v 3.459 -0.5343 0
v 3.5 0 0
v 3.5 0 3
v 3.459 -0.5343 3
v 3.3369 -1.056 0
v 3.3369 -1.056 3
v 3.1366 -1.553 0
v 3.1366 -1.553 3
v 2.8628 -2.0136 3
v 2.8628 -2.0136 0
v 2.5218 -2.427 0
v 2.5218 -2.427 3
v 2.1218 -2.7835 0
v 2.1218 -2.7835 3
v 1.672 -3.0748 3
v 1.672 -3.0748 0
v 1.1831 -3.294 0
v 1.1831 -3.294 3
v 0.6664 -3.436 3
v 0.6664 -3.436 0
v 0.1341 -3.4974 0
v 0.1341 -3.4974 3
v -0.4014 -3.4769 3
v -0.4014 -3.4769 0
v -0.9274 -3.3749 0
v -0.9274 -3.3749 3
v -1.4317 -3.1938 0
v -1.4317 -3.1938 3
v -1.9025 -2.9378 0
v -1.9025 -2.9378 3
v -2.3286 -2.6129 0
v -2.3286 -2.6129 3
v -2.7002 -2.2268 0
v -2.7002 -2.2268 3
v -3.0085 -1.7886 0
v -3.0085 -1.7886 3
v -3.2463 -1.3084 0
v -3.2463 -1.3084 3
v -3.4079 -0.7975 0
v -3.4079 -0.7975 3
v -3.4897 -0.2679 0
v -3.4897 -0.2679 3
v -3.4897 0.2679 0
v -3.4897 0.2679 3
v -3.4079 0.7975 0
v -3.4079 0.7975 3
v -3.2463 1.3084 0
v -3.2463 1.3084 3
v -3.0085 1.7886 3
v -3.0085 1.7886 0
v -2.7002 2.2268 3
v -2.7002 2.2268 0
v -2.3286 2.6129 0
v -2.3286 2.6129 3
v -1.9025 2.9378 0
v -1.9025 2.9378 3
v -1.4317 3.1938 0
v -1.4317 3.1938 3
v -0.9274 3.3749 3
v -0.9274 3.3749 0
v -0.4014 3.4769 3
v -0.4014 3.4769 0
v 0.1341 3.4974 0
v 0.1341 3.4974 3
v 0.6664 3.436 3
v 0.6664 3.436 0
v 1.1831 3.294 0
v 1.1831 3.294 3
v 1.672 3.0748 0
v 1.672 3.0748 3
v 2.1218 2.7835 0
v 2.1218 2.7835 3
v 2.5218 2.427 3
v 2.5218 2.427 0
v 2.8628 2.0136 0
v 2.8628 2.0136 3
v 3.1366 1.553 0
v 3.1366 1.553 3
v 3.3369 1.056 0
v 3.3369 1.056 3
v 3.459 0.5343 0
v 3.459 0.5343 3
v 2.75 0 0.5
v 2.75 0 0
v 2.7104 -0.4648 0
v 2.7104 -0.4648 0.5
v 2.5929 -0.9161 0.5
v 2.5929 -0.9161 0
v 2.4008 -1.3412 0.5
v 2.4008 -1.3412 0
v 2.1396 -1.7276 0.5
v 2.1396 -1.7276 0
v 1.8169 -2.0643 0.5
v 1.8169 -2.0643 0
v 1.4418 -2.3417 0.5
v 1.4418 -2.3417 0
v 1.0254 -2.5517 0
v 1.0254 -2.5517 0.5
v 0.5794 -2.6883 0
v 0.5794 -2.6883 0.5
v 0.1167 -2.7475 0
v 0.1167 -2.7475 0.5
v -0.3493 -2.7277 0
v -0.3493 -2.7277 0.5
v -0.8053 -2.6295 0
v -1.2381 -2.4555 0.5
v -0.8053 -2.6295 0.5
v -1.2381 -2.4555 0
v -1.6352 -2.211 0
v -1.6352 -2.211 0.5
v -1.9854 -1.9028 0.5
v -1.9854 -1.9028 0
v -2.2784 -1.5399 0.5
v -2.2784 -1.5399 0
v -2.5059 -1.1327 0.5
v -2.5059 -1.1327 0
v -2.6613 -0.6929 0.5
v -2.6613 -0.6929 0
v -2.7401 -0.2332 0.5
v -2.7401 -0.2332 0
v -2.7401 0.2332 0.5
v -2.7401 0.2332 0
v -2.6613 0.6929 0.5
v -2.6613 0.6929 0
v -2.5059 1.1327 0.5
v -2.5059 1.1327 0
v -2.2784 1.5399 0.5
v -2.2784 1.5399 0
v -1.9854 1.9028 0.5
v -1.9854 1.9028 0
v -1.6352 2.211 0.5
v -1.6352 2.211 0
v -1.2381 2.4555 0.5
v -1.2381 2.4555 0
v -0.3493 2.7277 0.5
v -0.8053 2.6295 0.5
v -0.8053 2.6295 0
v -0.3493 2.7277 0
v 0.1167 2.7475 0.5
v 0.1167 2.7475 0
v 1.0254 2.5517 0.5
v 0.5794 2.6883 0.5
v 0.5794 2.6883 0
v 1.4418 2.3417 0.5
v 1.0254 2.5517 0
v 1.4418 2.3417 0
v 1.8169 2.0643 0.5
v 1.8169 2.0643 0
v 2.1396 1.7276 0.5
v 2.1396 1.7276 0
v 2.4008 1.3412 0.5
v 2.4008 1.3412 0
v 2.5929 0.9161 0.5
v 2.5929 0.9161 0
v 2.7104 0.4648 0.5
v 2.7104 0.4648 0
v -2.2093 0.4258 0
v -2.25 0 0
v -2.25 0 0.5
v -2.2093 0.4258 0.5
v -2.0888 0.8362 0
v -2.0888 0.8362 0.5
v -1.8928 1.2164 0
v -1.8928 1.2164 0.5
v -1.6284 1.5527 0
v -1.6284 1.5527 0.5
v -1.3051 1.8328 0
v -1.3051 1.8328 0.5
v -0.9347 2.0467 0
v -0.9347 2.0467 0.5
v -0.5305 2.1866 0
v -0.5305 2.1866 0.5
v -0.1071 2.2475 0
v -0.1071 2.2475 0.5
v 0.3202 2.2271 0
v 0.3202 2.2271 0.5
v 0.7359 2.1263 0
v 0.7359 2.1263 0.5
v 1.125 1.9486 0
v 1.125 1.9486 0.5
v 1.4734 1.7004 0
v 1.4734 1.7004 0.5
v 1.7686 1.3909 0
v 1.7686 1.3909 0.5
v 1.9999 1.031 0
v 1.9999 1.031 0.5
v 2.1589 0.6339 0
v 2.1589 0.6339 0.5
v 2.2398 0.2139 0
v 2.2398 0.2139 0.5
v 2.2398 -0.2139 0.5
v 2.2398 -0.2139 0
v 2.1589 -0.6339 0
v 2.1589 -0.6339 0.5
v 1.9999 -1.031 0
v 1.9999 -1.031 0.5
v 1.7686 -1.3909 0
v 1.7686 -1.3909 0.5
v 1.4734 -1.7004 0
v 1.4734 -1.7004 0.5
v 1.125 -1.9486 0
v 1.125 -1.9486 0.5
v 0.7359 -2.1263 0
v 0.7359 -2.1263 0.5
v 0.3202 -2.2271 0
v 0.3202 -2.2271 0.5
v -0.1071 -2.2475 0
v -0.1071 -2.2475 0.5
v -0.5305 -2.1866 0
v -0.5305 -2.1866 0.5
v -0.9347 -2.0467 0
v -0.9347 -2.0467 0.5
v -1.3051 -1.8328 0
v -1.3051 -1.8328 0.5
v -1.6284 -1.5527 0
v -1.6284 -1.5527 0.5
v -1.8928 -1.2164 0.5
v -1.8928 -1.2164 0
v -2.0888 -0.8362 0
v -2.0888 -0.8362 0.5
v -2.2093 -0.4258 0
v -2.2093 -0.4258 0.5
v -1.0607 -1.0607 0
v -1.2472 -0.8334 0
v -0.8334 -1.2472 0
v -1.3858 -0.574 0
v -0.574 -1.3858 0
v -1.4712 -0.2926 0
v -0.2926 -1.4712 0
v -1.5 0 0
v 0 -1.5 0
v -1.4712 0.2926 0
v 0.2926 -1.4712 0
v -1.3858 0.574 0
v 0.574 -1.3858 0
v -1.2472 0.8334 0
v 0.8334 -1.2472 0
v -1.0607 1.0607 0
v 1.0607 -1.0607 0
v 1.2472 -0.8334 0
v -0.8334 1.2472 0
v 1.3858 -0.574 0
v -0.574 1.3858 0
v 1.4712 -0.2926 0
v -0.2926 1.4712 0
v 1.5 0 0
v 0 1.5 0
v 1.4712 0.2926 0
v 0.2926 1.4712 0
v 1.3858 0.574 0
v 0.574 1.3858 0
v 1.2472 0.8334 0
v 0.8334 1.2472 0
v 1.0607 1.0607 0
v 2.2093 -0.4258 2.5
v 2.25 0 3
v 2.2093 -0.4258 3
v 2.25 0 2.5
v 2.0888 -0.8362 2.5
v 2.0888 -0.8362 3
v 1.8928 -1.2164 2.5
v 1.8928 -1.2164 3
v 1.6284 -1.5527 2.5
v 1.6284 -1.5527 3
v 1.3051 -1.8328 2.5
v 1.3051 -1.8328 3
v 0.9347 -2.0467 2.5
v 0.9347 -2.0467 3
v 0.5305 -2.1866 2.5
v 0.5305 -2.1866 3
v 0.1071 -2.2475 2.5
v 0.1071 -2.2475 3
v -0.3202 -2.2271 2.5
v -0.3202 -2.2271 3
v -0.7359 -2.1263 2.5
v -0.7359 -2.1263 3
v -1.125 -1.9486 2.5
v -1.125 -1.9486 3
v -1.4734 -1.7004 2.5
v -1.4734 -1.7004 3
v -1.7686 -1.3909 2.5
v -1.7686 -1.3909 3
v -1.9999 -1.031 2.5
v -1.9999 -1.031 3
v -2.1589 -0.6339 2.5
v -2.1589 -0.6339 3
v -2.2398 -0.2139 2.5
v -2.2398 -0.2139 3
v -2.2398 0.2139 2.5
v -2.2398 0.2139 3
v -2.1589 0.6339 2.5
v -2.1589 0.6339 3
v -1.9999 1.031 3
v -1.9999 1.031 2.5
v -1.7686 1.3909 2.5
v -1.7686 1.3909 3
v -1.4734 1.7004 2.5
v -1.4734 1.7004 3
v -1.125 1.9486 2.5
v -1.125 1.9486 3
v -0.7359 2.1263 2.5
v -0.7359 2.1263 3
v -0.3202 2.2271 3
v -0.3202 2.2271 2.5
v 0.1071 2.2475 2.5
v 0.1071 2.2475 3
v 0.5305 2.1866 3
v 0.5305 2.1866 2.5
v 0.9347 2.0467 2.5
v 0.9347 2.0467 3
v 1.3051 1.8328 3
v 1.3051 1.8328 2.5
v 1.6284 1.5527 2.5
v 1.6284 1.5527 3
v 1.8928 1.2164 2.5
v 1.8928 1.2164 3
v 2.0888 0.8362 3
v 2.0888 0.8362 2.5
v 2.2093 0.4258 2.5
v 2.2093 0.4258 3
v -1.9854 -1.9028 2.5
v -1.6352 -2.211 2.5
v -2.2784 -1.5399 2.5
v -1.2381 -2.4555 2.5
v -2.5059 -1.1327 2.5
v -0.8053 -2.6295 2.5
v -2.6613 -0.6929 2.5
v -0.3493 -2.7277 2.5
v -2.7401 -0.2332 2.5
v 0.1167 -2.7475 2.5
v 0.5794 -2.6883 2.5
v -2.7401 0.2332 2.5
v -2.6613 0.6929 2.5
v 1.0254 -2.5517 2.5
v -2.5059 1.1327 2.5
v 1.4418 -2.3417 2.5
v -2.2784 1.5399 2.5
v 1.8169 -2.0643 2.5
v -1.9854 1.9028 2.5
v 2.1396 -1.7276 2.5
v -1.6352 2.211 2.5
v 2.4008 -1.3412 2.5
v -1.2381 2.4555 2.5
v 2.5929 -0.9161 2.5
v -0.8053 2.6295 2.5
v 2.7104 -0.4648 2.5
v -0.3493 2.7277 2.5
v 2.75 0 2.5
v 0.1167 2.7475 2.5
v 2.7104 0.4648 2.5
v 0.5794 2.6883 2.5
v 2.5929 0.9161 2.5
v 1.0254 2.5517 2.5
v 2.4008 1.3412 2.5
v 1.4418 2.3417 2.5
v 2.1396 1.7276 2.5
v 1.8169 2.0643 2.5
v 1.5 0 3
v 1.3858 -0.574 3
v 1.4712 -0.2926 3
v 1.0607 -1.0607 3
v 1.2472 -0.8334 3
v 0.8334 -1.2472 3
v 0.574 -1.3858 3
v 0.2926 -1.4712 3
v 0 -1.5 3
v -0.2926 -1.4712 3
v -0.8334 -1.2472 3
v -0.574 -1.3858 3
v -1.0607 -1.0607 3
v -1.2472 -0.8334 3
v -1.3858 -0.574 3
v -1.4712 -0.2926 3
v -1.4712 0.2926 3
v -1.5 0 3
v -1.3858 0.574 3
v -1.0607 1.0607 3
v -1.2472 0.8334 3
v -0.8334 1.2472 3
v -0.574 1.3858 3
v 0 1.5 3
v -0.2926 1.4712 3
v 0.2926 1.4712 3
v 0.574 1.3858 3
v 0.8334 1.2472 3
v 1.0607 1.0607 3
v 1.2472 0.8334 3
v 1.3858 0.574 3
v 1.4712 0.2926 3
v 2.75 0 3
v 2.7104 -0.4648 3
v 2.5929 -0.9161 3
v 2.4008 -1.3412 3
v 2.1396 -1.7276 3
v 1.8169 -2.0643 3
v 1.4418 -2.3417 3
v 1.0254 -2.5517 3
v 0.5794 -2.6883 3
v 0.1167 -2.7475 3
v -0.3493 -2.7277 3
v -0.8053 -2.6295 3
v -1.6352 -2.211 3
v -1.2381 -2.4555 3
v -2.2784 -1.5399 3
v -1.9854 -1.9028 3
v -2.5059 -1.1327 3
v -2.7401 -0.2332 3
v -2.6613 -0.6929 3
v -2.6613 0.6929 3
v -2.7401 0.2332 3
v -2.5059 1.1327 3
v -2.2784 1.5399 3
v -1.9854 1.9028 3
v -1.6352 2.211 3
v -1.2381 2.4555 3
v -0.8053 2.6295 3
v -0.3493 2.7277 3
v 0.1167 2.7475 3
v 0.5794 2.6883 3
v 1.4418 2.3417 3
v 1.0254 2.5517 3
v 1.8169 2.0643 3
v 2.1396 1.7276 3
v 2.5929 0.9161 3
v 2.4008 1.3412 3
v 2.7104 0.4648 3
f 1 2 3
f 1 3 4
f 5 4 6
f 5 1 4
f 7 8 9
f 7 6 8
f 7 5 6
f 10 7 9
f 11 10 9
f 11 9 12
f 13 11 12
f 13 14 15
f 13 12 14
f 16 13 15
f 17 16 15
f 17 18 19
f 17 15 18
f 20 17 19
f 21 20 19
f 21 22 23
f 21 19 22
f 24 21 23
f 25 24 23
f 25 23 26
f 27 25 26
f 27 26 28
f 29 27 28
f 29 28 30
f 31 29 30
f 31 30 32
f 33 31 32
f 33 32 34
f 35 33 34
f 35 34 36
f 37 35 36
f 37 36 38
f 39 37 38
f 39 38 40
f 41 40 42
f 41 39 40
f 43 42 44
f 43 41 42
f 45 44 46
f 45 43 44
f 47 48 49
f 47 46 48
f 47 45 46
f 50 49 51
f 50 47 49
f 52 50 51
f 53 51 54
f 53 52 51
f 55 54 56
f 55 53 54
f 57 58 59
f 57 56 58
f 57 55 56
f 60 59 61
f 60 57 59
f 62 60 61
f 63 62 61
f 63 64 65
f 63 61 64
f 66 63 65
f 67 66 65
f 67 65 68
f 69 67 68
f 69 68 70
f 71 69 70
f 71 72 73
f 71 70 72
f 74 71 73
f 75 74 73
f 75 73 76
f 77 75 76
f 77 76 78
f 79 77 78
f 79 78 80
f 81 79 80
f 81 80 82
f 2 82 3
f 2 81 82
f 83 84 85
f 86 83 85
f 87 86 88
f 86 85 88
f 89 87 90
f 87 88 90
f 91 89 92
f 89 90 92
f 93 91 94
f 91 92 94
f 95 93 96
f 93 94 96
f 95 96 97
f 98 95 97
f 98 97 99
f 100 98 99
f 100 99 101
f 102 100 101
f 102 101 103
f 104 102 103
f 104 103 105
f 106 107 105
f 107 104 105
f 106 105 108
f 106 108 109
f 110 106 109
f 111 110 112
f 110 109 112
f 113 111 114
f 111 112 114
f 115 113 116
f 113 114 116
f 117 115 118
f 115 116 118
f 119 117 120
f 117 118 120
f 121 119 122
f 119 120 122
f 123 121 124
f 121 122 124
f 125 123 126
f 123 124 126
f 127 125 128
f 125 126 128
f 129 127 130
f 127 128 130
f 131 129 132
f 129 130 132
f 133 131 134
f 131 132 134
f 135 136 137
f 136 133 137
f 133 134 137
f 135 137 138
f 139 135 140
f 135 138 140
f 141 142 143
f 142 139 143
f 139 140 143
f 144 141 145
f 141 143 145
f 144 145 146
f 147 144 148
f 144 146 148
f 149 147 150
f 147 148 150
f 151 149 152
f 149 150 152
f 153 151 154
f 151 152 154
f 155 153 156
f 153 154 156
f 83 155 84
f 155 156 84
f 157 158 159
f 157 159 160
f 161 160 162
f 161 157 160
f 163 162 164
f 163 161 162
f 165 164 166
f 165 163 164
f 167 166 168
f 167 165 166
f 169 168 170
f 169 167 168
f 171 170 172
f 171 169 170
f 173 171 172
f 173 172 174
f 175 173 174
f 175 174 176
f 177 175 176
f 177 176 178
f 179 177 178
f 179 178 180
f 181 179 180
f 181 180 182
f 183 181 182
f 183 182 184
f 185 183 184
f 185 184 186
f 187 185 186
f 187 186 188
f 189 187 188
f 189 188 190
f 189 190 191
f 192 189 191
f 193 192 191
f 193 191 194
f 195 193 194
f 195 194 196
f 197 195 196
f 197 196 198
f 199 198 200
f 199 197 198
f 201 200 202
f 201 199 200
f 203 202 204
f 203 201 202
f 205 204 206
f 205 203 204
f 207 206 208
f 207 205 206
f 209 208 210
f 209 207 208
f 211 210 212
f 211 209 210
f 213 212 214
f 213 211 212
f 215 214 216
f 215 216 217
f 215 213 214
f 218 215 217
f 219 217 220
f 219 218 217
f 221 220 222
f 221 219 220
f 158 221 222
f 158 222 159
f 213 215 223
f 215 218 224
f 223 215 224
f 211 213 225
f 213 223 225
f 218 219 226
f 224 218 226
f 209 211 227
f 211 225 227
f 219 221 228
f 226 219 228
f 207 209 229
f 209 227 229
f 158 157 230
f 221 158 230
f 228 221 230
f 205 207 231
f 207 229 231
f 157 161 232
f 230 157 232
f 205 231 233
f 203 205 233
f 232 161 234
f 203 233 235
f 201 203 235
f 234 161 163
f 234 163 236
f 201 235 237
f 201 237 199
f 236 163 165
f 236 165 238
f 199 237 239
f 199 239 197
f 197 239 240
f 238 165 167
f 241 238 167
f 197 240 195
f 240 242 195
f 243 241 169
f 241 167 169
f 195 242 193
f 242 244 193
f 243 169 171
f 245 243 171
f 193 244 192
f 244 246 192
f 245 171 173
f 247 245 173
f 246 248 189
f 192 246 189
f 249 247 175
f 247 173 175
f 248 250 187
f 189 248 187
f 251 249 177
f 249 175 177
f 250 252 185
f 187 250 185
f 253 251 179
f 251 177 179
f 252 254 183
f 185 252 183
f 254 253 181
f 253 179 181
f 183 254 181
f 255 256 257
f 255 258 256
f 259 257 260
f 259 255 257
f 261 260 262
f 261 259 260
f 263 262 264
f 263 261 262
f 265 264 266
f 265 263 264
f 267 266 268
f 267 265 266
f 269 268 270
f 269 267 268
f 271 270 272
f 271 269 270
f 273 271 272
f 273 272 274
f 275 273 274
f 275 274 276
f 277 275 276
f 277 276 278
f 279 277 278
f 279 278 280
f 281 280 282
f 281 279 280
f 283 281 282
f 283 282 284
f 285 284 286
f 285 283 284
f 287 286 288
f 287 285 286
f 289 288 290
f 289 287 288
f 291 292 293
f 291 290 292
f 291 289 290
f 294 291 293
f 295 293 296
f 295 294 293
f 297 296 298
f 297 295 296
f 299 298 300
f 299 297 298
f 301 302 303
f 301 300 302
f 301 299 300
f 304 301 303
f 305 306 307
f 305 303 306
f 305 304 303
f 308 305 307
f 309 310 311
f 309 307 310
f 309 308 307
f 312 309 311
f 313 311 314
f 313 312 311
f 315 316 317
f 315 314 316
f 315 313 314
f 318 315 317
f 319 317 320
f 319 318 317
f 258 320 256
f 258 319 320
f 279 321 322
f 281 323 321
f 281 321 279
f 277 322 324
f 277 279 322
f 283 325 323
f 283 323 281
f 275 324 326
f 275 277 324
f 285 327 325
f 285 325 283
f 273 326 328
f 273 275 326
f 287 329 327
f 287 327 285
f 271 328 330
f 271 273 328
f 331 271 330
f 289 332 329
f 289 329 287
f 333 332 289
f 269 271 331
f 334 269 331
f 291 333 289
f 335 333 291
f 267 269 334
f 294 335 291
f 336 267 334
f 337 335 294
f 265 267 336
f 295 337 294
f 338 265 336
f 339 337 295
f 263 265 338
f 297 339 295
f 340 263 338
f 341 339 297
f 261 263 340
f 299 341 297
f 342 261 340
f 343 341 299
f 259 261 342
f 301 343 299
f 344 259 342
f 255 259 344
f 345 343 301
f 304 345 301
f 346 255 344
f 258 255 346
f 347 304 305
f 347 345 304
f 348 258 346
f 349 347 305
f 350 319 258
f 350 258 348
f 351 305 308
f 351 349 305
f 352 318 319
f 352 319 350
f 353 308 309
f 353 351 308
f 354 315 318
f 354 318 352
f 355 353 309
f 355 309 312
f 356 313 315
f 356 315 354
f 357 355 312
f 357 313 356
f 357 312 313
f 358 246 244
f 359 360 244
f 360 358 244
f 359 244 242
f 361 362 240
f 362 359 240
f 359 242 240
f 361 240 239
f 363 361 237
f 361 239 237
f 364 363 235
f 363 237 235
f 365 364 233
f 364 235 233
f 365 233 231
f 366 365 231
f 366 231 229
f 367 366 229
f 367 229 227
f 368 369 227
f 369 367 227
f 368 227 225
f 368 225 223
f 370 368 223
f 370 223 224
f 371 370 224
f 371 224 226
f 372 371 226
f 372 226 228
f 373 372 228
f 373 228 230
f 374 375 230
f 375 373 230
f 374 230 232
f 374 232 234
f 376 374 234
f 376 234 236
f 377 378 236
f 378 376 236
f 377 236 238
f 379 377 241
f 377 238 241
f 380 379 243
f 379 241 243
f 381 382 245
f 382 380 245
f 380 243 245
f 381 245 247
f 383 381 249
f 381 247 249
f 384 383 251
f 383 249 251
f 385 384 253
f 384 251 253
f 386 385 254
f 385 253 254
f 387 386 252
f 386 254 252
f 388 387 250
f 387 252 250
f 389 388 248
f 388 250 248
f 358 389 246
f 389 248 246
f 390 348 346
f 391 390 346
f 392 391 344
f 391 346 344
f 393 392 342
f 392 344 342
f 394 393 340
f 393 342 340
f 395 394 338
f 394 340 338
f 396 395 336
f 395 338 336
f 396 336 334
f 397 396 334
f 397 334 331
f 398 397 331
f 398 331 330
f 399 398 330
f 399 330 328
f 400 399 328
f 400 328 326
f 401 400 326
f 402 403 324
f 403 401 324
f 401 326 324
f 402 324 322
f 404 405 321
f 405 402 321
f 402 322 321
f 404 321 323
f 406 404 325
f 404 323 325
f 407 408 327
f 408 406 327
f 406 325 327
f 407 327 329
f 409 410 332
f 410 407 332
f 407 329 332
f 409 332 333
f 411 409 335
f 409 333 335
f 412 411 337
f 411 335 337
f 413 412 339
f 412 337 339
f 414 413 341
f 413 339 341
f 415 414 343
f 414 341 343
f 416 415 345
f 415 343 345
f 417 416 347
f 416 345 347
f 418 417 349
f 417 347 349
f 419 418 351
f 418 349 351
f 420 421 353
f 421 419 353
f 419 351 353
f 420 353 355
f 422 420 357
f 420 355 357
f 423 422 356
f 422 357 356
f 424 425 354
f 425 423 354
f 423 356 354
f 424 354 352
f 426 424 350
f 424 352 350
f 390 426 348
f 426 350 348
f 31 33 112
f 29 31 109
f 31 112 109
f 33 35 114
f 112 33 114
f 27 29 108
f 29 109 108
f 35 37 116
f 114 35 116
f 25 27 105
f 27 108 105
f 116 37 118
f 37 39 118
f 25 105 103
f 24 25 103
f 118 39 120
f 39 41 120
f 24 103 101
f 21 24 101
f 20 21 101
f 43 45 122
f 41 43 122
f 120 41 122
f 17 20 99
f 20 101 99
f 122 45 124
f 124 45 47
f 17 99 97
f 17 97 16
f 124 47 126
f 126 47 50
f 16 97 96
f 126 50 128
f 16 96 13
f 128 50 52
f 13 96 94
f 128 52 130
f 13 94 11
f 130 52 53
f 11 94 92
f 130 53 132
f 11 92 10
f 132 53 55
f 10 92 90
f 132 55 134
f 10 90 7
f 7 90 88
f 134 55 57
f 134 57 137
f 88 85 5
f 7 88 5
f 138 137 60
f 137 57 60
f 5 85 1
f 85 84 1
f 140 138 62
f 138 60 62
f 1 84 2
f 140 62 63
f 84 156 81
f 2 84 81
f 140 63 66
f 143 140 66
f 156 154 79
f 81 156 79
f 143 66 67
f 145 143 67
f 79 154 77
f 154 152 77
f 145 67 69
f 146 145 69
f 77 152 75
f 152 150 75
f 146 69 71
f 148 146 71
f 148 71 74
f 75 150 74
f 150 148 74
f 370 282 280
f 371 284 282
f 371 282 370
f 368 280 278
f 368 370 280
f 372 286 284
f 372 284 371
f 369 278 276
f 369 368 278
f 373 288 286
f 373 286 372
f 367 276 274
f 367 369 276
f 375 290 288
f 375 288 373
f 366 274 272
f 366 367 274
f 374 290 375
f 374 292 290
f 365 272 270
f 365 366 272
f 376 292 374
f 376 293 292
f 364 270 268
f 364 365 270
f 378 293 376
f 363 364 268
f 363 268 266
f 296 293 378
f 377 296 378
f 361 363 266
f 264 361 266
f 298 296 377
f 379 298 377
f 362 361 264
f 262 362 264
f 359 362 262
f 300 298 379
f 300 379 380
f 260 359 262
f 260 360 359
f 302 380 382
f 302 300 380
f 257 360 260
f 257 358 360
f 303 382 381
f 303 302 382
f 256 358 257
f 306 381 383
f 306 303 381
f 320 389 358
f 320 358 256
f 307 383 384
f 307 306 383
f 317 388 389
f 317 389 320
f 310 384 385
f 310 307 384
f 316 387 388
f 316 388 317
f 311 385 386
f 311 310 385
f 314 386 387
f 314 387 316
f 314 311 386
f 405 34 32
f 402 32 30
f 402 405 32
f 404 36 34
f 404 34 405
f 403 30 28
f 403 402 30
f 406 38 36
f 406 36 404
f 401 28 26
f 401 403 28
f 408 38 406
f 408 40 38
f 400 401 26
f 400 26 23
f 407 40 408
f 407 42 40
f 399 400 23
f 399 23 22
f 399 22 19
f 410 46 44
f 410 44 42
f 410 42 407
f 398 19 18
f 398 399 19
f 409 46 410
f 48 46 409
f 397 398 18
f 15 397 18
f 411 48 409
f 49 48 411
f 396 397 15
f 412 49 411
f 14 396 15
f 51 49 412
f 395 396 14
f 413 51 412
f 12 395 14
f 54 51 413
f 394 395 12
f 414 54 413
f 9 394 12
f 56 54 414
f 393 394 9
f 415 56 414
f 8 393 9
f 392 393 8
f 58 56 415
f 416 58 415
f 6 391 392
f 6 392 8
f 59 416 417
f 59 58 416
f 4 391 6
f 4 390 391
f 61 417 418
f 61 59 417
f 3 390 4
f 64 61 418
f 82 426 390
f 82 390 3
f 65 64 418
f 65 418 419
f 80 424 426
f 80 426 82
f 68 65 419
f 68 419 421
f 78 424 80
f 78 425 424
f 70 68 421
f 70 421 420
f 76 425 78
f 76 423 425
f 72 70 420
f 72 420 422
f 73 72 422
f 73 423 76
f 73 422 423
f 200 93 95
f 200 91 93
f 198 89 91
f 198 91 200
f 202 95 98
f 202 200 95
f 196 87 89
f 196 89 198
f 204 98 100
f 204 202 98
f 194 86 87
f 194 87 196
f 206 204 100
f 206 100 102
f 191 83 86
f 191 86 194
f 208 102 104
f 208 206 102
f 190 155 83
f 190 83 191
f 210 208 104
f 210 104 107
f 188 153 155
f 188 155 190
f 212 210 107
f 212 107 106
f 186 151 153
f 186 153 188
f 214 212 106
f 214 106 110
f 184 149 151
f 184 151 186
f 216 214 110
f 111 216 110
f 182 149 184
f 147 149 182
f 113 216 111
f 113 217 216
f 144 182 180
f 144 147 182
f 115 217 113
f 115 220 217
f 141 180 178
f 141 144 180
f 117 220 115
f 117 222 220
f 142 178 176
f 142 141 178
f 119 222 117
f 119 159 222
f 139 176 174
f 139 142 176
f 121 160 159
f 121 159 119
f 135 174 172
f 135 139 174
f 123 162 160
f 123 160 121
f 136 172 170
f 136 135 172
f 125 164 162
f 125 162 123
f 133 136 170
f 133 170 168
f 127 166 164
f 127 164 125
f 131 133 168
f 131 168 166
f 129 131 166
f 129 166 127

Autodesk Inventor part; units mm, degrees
ref_plane "YZ Plane" through (0, 0, 0) normal (1, 0, 0) x (0, 1, 0)
ref_plane "XZ Plane" through (0, 0, 0) normal (0, 1, 0) x (-1, 0, 0)
ref_plane "XY Plane" through (0, 0, 0) normal (0, 0, 1) x (1, 0, 0)
sketch "Sketch1" plane through (0, 0, 0) normal (0, 0, 1) x (1, 0, 0)
  circle A0 centre (0, 0) radius 1.5
  circle A1 centre (0, 0) radius 2.25
  dimension "d0" = 3
  dimension "d2" = 4.5
extrude "Extrusion1" add sketch "Sketch1" along normal blind 3
sketch "Sketch3" plane through (0, 0, 0) normal (0, 0, 1) x (1, 0, 0)
  circle A0 centre (0, 0) radius 2.25
  circle A1 centre (0, 0) radius 2.75
  dimension "d10" = 4.5
  dimension "d11" = 5.5
extrude "Extrusion3" add sketch "Sketch3" along normal blind 2.5
sketch "Sketch4" plane through (0, 0, 0) normal (0, 0, -1) x (-1, 0, 0)
  circle A0 centre (0, 0) radius 2.25
  circle A1 centre (0, 0) radius 2.75
  dimension "d14" = 4.5
  dimension "d15" = 5.5
extrude "Extrusion4" cut sketch "Sketch4" against normal blind 0.5
sketch "Sketch5" plane through (0, 0, 0) normal (0, 0, 1) x (1, 0, 0)
  circle A0 centre (0, 0) radius 2.75
  circle A1 centre (0, 0) radius 3.5
  dimension "d18" = 5.5
  dimension "d19" = 7
extrude "Extrusion5" add sketch "Sketch5" along normal blind 3
properties part number "2P.03.01.00.01.IM.Bearing373" material "Aluminum 6061"
